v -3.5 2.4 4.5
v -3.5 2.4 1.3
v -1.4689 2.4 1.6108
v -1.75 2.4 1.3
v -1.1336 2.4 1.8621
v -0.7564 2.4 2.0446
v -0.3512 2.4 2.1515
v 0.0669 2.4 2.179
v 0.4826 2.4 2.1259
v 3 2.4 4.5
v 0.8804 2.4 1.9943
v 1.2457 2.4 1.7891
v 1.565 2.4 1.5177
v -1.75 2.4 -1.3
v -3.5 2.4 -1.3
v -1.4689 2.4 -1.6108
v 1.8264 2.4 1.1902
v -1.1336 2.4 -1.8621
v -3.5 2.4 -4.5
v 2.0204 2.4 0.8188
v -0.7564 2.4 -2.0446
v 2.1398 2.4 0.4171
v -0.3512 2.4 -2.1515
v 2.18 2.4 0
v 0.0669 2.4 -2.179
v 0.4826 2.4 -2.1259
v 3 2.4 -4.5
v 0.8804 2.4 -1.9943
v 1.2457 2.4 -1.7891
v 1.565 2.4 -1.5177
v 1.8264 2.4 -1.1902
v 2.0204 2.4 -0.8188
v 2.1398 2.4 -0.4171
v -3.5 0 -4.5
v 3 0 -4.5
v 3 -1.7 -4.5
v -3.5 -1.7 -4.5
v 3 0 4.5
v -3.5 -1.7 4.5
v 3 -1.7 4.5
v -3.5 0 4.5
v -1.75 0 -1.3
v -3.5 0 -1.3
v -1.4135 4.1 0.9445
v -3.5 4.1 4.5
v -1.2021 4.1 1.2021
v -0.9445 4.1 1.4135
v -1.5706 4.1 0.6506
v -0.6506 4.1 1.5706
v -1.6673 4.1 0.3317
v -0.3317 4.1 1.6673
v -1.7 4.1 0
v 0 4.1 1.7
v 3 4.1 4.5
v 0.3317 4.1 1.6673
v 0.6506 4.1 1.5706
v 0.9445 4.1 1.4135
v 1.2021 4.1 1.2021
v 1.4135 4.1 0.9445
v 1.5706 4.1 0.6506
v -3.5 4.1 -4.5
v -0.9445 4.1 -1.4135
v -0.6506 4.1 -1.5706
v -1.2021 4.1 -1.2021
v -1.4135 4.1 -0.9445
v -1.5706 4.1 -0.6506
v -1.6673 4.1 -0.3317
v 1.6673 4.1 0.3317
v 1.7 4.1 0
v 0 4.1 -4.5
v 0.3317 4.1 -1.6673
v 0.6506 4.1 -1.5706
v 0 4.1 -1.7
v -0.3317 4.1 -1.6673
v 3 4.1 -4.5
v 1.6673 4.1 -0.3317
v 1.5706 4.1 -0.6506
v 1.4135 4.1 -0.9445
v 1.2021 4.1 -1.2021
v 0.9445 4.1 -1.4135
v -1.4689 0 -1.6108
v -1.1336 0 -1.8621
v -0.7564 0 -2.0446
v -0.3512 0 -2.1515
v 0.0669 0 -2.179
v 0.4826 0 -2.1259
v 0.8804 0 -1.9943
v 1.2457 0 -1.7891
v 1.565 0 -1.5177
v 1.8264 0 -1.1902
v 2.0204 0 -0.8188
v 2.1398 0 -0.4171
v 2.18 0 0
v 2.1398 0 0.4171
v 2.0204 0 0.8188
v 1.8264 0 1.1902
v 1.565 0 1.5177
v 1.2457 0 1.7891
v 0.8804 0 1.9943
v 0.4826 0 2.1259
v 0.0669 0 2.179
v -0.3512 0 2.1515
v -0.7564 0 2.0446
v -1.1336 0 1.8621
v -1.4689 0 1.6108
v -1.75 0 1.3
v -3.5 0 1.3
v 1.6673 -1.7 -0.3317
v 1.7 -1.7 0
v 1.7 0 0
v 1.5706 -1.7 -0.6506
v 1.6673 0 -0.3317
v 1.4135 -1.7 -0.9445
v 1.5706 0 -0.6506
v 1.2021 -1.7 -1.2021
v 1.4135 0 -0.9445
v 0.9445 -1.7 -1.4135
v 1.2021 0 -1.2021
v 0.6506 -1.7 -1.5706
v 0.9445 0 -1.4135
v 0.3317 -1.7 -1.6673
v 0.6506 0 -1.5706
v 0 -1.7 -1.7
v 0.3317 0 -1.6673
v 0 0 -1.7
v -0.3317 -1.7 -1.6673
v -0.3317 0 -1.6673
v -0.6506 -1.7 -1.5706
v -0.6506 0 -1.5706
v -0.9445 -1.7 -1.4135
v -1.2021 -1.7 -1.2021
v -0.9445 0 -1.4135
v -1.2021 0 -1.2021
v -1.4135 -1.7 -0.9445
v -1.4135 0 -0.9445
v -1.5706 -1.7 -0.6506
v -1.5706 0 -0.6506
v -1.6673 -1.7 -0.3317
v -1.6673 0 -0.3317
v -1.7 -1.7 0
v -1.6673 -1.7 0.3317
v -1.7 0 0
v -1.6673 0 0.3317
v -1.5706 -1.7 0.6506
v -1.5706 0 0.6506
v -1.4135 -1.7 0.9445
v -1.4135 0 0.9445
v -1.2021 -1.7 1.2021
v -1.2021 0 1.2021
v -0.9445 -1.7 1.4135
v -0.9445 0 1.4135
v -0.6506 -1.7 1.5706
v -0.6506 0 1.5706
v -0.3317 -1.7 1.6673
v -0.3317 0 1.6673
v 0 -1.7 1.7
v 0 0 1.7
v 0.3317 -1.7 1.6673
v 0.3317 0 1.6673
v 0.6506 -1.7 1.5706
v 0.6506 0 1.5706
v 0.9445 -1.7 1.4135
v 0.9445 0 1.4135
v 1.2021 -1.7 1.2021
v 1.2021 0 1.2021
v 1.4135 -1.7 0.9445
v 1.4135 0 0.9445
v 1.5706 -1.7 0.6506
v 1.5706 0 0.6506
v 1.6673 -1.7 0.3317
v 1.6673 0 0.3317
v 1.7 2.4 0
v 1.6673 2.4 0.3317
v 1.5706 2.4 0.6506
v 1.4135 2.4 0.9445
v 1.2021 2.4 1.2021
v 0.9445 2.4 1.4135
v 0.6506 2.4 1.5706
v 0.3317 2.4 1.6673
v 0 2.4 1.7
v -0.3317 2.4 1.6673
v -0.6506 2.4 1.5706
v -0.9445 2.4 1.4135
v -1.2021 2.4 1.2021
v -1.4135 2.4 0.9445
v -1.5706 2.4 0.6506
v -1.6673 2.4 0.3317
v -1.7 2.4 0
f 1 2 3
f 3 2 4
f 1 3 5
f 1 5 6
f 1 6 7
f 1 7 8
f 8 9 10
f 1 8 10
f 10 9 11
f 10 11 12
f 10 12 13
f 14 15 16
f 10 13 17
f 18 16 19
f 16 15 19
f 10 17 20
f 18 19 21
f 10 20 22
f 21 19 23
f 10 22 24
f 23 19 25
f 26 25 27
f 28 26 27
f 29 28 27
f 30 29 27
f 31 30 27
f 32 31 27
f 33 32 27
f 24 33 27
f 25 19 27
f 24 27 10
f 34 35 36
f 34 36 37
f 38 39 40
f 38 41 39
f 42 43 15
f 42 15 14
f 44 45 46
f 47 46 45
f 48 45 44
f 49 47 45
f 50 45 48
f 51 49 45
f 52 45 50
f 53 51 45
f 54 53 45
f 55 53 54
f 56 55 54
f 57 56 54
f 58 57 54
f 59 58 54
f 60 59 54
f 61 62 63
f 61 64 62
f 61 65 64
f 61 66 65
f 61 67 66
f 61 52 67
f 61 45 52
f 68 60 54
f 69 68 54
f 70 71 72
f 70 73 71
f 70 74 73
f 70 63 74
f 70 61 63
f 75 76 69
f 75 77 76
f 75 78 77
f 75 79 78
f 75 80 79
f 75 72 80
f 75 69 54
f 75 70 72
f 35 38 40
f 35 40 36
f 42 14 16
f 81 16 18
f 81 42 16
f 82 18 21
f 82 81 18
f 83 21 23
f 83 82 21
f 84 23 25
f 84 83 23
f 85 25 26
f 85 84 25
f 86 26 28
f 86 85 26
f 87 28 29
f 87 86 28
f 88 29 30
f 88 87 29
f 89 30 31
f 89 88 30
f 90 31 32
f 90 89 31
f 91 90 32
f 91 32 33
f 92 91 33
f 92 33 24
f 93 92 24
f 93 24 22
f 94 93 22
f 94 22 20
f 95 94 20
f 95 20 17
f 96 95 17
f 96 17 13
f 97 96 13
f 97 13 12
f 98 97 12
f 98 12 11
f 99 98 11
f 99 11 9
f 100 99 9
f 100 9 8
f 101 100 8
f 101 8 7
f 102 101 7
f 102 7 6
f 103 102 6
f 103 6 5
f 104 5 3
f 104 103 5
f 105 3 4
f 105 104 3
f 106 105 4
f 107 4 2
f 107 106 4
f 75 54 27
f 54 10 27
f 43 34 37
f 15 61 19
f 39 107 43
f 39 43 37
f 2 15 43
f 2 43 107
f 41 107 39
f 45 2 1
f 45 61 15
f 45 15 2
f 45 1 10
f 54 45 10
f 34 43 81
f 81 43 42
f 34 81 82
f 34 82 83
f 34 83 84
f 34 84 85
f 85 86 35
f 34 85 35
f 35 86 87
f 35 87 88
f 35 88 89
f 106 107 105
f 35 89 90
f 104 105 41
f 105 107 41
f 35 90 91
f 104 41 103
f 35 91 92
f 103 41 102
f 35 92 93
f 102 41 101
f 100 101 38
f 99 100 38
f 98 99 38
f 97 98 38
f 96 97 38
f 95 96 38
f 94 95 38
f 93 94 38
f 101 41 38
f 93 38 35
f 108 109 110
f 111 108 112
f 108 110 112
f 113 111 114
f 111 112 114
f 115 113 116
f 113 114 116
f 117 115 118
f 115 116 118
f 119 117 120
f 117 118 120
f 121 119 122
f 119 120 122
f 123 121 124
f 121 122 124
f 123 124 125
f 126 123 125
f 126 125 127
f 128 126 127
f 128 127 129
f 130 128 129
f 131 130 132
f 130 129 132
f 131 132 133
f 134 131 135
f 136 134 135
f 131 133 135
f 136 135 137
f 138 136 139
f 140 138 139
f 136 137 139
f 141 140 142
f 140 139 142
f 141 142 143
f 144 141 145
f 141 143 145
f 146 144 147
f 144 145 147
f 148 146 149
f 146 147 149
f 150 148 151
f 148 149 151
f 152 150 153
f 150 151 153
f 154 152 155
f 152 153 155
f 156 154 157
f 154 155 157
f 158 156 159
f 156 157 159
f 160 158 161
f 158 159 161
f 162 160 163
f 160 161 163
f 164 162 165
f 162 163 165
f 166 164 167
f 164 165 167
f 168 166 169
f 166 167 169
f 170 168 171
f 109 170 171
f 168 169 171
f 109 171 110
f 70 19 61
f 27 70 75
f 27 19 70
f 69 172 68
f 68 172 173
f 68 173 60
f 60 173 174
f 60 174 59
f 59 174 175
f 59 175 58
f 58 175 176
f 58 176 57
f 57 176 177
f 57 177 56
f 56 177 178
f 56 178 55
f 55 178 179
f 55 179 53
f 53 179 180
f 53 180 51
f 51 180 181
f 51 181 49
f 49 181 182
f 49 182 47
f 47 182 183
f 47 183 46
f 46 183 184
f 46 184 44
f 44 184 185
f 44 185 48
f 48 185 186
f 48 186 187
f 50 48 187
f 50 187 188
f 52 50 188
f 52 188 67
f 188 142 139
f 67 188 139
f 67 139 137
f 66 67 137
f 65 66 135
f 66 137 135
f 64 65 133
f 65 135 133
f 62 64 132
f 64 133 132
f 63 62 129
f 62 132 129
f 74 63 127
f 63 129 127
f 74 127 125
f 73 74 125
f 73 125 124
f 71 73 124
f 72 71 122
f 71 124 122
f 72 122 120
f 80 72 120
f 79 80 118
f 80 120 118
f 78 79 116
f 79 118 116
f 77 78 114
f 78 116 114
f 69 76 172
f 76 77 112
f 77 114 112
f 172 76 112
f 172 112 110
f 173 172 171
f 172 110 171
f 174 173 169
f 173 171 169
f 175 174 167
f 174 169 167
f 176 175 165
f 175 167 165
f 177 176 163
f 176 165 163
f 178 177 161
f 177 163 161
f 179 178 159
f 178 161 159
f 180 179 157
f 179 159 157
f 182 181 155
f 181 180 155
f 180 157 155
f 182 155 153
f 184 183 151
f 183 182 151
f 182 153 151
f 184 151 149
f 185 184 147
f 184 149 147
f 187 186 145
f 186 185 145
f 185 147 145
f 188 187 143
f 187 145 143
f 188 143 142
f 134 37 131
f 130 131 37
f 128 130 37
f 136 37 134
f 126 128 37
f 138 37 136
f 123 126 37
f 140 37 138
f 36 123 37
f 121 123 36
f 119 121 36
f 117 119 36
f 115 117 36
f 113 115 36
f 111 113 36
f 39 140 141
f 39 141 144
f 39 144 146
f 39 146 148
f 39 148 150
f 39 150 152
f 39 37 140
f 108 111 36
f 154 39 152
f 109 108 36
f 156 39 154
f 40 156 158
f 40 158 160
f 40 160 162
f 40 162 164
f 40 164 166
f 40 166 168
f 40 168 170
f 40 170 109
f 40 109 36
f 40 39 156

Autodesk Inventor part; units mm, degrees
ref_plane "YZ Plane" through (0, 0, 0) normal (1, 0, 0) x (0, 1, 0)
ref_plane "XZ Plane" through (0, 0, 0) normal (0, 1, 0) x (-1, 0, 0)
ref_plane "XY Plane" through (0, 0, 0) normal (0, 0, 1) x (1, 0, 0)
sketch "Sketch1" plane through (0, 0, 0) normal (0, 1, 0) x (-1, 0, 0)
  arc A0 (1.75, 1.3) -> (1.75, -1.3) centre (0, 0) ccw
  circle A1 centre (0, 0) radius 1.7
  line L0 (0, 0) -> (0, 1.3)
  line L1 (3.5, 1.3) -> (3.5, -1.3)
  line L2 (0, 1.3) -> (1.0954, 1.3)
  line L3 (1.75, 1.3) -> (3.5, 1.3)
  line L4 (3.5, -1.3) -> (1.75, -1.3)
  dimension "d1" = 3.4
  dimension "d0" = 4.36
  dimension "d2" = 1.3
  dimension "d3" = 3.5
  dimension "d4" = 2.6
extrude "Extrusion1" add sketch "Sketch1" along normal blind 2.4
sketch "Sketch2" plane through (0, 2.4, 0) normal (0, 1, 0) x (1, 0, 0)
  circle A0 centre (0, 0) radius 1.7
  line L0 (0, 0) -> (0, 4.5)
  line L1 (0, 4.5) -> (3, 4.5)
  line L2 (3, 4.5) -> (-3.5, 4.5)
  line L3 (-3.5, 4.5) -> (-3.5, -4.5)
  line L4 (-3.5, -4.5) -> (3, -4.5)
  line L5 (3, -4.5) -> (3, 4.5)
  dimension "d7" = 4.5
  dimension "d8" = 3
  dimension "d9" = 9
extrude "Extrusion2" add sketch "Sketch2" along normal blind 1.7
sketch "Sketch3" plane through (0, 0, 0) normal (0, -1, 0) x (1, 0, 0)
  line L0 (-3.5, 4.5) -> (3, 4.5) projected
  line L1 (3, 4.5) -> (3, -4.5) projected
  line L2 (-3.5, 4.5) -> (3, 4.5)
  line L3 (3, 4.5) -> (3, -4.5)
  line L4 (3, -4.5) -> (-3.5, -4.5)
  line L5 (-3.5, -4.5) -> (-3.5, 4.5)
  point P0 (0, 0)
extrude "Extrusion3" add sketch "Sketch3" along normal blind 1.7
sketch "Sketch4" plane through (0, 0, 0) normal (0, 1, 0) x (1, 0, 0)
  circle A0 centre (0, 0) radius 1.7
extrude "Extrusion4" cut sketch "Sketch4" against normal blind 1.7
properties part number "MMAE 232 CAD Assignment 2 Rubber Grommet-Nicholas Skiba"
